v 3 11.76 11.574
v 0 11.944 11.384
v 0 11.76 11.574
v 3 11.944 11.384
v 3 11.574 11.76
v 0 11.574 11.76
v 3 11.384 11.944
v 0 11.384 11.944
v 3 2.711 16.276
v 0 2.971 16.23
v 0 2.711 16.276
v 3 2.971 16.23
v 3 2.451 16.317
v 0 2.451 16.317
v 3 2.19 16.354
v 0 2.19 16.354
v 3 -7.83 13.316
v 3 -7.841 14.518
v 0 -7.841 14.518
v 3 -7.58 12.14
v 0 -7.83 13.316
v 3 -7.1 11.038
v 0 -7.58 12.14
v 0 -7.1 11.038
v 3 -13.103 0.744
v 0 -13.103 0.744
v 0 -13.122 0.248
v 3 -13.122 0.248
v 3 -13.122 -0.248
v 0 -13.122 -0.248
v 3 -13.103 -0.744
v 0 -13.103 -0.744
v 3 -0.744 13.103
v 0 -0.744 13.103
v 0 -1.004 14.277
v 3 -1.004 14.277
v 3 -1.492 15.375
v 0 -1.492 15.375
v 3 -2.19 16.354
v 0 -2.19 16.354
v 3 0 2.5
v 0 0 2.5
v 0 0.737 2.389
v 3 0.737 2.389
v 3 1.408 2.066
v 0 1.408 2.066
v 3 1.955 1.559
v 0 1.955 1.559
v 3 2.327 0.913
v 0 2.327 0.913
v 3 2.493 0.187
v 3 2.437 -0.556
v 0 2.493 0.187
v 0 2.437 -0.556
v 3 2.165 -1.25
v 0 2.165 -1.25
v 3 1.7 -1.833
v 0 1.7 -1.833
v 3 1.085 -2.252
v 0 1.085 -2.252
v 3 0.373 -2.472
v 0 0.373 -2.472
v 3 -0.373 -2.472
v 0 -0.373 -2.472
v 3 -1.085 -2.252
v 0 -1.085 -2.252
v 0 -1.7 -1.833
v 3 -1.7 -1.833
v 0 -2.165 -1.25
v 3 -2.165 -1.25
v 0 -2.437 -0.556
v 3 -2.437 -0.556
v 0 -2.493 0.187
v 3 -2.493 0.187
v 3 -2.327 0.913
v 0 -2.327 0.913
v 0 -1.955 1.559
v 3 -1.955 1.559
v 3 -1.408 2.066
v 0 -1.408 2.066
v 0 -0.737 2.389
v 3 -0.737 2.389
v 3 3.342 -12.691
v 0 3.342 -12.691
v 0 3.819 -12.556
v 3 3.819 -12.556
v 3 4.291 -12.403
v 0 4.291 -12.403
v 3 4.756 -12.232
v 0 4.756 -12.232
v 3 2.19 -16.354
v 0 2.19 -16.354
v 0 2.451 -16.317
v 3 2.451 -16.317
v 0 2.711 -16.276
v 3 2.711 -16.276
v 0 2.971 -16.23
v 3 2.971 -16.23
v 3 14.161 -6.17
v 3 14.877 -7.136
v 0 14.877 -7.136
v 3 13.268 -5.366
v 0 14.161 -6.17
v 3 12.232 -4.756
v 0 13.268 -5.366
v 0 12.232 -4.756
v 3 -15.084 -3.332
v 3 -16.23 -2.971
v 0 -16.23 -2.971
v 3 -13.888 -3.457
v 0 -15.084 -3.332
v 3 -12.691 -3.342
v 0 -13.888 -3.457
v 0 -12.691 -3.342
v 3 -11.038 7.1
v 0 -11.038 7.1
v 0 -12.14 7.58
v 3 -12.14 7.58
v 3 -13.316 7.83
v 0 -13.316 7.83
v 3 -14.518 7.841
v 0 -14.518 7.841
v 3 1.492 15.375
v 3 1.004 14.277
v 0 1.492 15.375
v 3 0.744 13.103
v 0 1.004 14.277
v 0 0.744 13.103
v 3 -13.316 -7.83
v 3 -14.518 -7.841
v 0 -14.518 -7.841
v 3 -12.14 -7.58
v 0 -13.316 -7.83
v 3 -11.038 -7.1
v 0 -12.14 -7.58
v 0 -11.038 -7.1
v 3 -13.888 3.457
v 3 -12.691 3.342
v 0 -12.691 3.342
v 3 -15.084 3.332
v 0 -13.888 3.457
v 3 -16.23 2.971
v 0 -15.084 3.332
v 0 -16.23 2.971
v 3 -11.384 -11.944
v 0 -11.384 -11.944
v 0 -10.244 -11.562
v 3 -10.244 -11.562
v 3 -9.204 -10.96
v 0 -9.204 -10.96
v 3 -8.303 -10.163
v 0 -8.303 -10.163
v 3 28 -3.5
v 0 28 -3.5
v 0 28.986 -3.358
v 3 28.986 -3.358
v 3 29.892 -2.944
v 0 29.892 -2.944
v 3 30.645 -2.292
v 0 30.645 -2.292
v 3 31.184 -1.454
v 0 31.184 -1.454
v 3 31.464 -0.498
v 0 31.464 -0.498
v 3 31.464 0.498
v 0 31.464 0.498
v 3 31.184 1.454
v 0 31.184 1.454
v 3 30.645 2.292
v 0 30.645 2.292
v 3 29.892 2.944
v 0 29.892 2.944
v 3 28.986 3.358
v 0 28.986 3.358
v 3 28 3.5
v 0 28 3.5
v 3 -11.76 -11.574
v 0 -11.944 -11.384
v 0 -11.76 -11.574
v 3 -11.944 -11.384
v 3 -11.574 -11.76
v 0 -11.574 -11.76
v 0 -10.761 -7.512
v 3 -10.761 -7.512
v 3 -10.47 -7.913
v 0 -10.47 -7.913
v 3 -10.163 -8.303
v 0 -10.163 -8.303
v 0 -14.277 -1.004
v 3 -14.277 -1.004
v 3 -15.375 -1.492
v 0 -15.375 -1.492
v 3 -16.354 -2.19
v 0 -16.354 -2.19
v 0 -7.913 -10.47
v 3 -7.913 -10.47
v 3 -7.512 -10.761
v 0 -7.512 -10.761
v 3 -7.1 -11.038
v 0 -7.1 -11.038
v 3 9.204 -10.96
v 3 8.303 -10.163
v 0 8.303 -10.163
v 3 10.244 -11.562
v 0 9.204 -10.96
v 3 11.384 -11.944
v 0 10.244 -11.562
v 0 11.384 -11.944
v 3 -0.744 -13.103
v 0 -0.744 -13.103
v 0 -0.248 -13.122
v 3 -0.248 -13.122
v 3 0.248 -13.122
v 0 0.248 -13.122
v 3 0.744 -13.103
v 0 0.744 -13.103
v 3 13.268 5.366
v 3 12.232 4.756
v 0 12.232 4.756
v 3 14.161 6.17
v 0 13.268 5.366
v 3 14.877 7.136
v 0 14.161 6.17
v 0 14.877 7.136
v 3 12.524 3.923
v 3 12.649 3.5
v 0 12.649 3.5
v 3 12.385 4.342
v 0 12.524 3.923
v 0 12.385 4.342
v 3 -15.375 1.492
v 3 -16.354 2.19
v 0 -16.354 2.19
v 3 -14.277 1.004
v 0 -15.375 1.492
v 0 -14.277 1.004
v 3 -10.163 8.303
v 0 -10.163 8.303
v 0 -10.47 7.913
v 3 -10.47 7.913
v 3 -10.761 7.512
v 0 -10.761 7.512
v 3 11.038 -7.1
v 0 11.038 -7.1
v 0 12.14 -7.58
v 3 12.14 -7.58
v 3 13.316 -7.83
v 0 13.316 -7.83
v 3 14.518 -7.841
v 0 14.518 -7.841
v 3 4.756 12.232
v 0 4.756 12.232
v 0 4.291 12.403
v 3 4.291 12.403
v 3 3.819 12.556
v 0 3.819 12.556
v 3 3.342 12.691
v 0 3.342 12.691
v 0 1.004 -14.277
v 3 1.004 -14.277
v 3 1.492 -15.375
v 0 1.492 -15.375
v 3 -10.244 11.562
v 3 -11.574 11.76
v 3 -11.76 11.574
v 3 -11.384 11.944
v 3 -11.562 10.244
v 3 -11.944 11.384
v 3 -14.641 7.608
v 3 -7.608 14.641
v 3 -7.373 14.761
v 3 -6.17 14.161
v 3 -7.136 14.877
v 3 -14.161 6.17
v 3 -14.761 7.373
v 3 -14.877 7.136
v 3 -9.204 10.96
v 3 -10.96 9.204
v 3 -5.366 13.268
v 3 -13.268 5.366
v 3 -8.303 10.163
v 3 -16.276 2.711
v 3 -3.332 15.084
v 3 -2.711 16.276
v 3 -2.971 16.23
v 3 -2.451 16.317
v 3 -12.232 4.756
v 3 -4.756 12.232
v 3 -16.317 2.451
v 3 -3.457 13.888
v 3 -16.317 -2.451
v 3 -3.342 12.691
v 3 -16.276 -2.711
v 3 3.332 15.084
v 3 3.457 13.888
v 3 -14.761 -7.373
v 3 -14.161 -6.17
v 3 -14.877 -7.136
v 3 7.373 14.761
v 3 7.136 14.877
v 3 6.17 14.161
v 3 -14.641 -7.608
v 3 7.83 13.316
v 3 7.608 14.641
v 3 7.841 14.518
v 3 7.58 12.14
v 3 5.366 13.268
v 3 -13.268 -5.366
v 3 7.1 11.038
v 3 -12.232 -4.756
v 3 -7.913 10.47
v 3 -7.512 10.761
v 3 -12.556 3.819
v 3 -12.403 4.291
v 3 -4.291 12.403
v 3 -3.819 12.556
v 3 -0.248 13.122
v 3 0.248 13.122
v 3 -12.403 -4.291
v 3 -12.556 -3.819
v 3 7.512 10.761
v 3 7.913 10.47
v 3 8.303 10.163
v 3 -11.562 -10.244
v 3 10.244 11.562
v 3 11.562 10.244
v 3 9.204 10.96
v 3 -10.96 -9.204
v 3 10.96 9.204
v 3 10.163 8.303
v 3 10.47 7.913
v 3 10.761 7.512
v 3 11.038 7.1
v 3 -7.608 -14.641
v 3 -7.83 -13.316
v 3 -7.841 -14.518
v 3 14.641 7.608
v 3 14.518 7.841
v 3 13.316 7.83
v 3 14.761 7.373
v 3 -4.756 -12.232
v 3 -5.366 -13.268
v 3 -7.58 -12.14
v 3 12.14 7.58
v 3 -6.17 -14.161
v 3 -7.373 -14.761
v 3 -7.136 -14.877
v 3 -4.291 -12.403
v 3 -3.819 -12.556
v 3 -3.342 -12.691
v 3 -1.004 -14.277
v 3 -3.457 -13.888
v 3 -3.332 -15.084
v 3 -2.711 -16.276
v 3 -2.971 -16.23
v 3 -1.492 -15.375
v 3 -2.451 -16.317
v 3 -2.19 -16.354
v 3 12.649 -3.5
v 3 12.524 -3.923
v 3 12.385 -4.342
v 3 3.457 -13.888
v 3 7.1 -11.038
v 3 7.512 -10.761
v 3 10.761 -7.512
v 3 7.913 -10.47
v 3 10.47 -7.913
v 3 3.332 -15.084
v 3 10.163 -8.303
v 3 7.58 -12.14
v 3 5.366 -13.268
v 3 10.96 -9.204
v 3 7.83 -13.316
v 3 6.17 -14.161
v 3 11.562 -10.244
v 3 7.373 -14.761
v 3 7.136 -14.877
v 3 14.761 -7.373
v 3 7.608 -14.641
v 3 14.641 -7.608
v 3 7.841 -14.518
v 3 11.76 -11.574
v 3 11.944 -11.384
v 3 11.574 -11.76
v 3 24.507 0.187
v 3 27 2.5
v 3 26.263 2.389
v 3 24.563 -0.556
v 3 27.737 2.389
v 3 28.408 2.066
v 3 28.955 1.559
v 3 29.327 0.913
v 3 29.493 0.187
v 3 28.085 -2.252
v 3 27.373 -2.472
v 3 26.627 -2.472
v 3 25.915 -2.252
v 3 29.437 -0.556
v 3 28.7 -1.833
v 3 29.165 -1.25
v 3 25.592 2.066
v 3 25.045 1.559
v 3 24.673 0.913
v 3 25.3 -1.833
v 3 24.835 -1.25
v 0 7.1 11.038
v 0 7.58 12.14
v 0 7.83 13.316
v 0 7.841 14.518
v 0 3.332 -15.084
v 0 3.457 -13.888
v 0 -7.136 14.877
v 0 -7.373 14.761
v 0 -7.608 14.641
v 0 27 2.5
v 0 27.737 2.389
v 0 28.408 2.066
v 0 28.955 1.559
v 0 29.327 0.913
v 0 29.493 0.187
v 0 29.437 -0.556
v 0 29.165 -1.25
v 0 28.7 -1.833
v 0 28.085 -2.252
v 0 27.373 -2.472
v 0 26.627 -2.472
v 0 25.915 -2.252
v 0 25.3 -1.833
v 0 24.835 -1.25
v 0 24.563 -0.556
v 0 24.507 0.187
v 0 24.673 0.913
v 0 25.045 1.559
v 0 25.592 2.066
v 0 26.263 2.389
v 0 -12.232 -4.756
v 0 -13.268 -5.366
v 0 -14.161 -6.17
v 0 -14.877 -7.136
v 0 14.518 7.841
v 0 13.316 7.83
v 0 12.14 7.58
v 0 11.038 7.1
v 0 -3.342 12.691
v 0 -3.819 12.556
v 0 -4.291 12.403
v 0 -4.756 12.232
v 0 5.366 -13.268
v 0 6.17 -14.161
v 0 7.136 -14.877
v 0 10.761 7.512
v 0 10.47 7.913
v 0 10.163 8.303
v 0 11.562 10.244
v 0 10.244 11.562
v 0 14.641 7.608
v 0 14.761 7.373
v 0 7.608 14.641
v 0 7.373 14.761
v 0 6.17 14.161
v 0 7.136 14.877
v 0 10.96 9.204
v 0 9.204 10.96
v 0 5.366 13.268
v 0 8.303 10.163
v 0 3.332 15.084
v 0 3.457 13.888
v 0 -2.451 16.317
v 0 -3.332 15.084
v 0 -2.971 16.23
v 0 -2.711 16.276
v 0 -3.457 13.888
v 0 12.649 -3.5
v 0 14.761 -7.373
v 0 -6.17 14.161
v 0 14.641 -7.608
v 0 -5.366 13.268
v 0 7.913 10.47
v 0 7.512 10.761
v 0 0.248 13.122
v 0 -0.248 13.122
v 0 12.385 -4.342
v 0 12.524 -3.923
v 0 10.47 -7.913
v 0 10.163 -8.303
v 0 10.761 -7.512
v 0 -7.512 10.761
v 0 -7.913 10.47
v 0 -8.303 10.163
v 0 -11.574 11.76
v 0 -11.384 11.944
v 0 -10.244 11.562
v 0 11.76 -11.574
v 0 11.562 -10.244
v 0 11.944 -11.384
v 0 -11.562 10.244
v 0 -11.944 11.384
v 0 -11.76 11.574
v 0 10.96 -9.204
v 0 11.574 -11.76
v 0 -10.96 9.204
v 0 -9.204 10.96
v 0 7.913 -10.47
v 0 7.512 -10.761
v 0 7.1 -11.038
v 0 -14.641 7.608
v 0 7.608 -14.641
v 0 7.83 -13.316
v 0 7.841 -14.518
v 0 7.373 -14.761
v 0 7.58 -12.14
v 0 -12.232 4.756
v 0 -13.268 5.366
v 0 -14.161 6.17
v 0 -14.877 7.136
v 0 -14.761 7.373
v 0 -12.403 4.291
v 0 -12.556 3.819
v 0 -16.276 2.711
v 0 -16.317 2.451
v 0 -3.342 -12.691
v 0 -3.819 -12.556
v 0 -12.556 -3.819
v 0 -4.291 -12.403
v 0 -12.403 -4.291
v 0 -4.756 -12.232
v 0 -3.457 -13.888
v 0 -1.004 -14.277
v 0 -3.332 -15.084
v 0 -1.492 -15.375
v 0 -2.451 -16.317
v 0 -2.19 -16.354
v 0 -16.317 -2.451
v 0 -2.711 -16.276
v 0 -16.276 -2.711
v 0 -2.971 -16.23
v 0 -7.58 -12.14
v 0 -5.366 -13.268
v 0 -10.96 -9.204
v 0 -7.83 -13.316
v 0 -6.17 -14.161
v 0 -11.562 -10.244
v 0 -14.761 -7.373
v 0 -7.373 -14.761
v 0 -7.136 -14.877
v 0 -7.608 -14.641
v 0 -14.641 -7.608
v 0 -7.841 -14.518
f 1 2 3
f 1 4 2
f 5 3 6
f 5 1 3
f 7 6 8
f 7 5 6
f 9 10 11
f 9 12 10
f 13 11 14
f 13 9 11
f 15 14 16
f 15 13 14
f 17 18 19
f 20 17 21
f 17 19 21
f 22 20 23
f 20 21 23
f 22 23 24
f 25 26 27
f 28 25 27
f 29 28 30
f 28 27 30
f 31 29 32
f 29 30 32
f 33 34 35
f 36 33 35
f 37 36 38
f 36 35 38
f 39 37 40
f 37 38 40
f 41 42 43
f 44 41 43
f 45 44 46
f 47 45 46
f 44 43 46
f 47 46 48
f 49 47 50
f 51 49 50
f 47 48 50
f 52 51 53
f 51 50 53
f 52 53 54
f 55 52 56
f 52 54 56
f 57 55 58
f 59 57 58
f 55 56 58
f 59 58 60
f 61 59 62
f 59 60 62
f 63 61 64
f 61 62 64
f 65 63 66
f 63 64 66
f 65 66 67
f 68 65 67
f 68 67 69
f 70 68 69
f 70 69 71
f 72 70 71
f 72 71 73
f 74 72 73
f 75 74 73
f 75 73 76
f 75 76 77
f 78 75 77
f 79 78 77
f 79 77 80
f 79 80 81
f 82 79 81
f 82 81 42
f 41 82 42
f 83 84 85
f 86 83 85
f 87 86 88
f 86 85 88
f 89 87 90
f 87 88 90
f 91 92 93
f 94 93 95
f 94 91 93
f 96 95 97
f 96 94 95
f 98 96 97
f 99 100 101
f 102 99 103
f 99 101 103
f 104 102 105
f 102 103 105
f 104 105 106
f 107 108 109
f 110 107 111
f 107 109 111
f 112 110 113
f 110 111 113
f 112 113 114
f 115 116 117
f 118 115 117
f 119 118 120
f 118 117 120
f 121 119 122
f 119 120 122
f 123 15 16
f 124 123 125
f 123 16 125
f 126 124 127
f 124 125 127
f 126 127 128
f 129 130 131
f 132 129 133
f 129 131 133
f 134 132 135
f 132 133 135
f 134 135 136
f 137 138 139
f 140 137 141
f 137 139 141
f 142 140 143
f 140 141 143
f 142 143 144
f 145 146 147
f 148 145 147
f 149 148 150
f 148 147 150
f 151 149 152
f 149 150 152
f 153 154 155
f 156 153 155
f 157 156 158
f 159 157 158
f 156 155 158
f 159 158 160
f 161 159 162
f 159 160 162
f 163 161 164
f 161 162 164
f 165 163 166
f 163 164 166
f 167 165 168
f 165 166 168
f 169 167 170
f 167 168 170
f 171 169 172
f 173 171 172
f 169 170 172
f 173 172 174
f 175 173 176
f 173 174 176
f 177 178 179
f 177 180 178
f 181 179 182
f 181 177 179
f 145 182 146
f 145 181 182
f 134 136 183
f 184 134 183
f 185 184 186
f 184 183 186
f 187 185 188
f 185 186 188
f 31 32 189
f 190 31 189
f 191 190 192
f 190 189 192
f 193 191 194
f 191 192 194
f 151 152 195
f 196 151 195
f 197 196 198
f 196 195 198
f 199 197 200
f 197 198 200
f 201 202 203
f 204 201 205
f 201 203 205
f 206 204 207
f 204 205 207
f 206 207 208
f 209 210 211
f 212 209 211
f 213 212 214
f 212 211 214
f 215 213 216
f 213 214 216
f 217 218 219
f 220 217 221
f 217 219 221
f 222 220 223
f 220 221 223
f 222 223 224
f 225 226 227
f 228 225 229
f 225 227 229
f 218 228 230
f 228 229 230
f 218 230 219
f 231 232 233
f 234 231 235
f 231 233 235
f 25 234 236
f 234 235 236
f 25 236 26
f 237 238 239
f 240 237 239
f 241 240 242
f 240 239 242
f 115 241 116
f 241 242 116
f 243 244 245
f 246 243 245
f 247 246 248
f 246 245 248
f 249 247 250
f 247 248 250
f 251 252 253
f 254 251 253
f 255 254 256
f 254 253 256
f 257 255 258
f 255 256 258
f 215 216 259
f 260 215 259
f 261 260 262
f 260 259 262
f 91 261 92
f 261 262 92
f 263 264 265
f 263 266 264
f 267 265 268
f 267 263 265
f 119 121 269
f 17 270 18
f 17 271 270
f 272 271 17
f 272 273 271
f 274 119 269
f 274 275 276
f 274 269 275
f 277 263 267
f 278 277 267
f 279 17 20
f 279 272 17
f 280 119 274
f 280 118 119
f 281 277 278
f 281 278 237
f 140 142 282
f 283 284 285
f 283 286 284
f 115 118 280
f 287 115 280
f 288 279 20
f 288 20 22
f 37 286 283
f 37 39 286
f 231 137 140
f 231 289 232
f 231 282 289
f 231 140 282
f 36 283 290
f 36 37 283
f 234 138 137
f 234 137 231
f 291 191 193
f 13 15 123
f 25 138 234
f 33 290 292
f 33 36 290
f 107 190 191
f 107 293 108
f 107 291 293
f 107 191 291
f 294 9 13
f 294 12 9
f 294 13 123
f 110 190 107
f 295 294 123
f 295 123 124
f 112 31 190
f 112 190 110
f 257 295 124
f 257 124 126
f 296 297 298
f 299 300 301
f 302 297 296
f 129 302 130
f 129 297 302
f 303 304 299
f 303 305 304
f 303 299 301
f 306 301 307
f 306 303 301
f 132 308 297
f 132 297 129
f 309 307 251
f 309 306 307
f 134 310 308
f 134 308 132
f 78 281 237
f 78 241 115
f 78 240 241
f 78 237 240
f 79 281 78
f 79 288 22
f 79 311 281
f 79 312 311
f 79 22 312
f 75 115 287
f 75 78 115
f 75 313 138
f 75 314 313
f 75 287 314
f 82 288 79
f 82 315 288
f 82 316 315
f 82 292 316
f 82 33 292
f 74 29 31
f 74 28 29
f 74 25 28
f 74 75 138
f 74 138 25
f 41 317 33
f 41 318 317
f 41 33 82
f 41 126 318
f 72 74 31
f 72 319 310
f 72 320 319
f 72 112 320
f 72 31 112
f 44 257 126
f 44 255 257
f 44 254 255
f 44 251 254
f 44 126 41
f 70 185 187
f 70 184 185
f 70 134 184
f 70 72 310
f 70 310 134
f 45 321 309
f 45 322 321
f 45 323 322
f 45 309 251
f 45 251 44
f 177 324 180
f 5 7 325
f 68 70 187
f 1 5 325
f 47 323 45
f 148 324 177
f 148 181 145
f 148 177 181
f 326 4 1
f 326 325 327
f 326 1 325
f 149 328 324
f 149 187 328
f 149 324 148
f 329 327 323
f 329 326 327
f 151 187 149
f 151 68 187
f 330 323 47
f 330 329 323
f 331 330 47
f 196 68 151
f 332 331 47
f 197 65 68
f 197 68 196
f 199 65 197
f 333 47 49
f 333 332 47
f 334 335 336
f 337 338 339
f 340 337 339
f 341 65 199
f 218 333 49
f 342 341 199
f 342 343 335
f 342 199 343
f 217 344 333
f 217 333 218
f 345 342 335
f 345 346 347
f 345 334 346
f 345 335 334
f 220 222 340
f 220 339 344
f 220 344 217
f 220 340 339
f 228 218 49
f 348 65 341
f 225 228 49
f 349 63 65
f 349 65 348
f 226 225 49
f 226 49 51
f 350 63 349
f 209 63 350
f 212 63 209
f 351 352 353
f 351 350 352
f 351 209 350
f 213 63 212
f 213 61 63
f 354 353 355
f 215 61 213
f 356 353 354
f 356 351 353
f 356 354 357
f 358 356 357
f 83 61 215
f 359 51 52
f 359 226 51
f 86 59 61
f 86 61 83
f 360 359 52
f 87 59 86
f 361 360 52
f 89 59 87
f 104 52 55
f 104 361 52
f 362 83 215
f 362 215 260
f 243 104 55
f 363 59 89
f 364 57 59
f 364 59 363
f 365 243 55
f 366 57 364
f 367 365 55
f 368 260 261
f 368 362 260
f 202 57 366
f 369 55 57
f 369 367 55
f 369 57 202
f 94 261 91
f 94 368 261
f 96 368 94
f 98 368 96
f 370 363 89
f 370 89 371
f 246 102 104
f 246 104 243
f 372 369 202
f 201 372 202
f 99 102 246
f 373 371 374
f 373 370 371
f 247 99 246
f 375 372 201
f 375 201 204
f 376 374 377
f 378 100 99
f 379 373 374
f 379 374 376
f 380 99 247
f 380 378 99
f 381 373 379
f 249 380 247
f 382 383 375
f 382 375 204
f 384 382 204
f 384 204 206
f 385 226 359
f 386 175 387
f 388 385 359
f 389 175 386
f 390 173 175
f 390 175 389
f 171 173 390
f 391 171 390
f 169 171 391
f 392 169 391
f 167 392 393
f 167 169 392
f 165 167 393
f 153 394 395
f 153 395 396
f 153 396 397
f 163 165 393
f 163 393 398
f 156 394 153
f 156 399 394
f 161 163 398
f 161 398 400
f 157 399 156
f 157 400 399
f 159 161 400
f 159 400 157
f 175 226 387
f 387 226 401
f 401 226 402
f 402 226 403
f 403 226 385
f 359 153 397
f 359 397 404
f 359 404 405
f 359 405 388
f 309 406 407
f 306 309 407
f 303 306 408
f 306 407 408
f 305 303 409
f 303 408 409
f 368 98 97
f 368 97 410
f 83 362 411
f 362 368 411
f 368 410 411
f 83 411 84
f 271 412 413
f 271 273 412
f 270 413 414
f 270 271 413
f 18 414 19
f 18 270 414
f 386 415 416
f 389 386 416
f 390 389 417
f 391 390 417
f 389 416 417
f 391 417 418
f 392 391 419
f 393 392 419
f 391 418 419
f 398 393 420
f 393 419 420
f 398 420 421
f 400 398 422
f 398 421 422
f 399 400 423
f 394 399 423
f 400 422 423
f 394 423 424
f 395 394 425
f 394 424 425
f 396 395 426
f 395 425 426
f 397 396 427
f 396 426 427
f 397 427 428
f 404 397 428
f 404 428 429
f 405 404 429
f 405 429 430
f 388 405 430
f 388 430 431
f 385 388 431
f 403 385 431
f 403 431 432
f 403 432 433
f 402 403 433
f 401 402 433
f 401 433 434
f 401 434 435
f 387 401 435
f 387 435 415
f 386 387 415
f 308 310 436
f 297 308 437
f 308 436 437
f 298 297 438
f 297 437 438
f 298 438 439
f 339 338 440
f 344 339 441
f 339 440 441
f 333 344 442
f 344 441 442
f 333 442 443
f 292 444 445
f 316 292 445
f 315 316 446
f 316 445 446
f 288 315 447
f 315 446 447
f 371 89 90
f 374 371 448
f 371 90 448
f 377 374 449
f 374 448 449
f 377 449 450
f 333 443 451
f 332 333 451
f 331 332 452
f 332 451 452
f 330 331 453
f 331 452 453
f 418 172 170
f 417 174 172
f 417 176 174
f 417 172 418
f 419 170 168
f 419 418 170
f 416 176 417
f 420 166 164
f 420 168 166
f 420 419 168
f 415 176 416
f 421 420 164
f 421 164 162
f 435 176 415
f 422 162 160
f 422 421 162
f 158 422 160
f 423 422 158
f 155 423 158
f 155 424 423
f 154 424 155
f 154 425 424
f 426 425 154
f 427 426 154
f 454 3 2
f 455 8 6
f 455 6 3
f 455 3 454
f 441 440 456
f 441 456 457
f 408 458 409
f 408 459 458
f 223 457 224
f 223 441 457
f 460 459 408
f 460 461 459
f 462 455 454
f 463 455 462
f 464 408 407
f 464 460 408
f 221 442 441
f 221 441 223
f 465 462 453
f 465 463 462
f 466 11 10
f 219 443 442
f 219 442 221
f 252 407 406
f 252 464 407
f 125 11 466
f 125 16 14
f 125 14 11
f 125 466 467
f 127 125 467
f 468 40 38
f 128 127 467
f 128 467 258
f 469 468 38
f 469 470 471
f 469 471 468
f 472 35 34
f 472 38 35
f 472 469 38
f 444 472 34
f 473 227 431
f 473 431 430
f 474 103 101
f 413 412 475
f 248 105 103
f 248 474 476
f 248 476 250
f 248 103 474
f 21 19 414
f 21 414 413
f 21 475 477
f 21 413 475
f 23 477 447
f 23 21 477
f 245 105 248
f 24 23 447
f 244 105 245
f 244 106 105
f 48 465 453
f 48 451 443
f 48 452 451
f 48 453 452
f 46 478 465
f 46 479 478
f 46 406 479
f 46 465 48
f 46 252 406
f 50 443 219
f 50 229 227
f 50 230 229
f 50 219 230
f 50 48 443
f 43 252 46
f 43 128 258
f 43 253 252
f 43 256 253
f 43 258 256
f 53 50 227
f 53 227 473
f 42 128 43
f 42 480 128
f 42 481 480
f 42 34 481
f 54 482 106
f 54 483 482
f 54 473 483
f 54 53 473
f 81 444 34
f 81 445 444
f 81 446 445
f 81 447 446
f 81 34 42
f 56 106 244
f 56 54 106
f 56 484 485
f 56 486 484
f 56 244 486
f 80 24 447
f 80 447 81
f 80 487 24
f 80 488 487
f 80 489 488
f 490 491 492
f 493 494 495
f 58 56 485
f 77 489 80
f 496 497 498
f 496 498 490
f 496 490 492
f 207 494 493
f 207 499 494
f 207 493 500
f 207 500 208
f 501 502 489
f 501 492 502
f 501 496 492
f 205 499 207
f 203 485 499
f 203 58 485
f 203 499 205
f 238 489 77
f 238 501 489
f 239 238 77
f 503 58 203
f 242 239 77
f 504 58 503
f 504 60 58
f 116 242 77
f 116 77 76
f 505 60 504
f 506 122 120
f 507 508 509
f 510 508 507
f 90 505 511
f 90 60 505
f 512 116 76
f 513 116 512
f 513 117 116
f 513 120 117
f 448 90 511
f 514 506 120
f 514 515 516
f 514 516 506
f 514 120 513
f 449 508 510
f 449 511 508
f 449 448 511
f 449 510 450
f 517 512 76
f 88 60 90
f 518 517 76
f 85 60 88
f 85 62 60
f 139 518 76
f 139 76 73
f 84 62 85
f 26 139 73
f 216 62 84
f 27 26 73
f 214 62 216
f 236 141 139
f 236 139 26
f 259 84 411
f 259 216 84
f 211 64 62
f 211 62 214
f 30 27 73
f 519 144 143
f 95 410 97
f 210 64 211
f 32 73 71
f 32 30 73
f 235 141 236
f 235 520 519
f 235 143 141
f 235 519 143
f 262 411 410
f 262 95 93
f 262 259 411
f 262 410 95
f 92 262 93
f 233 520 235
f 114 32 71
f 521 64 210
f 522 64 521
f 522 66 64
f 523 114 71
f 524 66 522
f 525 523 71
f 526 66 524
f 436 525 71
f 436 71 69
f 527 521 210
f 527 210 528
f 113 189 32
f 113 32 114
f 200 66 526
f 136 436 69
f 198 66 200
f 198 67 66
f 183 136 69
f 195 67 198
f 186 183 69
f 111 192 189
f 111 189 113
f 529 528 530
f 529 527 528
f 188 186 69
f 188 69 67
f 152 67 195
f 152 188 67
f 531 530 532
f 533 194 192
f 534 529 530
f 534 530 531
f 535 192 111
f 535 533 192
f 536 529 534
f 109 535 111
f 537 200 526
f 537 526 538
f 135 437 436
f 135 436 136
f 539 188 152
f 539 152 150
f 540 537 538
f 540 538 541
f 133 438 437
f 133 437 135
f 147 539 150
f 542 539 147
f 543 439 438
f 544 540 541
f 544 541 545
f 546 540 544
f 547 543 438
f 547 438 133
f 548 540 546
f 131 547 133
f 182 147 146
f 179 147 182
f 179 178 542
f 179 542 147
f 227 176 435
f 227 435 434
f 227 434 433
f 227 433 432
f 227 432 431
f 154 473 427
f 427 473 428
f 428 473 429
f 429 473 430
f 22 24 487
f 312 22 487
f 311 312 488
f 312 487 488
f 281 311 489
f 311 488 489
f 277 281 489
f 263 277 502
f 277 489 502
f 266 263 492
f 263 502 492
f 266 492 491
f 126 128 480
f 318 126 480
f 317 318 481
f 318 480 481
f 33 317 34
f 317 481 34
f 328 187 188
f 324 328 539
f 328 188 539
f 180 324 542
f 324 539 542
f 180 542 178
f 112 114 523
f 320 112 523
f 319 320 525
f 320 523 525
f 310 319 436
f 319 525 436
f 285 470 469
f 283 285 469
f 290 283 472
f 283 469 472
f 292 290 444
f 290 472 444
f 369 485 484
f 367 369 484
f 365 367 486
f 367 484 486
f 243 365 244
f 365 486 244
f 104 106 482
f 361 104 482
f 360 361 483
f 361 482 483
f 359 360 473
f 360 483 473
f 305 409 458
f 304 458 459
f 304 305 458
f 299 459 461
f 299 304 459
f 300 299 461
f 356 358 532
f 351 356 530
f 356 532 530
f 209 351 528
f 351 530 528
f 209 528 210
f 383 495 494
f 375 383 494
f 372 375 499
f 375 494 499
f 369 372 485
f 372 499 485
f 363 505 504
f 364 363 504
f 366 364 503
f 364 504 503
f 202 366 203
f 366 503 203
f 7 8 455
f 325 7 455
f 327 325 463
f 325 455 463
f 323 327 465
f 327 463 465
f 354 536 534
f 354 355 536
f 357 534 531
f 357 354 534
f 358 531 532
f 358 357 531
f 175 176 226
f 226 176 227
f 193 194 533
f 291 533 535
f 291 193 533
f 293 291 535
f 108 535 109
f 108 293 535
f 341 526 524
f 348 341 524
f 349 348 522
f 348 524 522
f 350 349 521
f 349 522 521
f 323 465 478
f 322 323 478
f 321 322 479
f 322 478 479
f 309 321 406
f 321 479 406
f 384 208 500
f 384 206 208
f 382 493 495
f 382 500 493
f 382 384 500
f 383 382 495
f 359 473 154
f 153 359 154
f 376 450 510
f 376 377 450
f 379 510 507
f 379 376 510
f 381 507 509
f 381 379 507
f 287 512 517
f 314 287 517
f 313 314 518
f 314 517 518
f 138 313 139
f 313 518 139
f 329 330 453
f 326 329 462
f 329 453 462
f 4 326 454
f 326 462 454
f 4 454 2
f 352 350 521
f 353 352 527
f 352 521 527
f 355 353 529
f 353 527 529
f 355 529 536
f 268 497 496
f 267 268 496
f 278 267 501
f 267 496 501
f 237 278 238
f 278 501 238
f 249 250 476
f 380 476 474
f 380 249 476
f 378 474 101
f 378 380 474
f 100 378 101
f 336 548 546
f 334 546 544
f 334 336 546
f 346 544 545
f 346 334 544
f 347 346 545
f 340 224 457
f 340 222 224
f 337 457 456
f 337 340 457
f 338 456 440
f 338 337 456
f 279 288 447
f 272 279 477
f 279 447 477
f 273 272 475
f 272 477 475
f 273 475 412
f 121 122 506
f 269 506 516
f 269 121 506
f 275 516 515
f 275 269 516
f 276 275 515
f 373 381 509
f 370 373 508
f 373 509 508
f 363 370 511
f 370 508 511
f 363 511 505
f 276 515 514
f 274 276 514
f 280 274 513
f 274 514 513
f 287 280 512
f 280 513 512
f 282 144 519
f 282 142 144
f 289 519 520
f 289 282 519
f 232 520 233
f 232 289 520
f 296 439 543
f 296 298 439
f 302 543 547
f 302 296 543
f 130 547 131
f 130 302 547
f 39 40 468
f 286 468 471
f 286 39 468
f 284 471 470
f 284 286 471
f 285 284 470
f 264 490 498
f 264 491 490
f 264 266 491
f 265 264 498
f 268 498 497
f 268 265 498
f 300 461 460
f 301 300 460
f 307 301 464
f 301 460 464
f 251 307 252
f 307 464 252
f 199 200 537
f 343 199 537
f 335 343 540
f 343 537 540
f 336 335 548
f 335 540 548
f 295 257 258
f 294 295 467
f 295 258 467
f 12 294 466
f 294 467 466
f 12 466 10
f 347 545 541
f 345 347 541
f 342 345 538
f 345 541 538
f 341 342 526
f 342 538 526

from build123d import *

# Parameters (mm, degrees)
BASPROSKE_W         = 3
BASPROSKE_H         = 16.5
TOOTHCUT_DEPTH      = 24.526580712
TEETHCUTS_COUNT     = 20
TEETHCUTS_ANGLE     = 342
EXTRUDE_3_DEPTH     = 3
SKETCH_3_R          = 2.5
CUT_EXTRUDE_2_DEPTH = 36.618883333


with BuildPart() as part:
    # BasProSke → Base-Revolve (revolve)
    with BuildSketch(Plane(origin=(0, 0, 0), x_dir=(1, 0, 0), z_dir=(0, 1, 0)), mode=Mode.PRIVATE) as base_revolve_sk:
        with Locations((1.5, 8.25)):
            Rectangle(BASPROSKE_W, BASPROSKE_H)
    revolve(base_revolve_sk.sketch.rotate(Axis((-10, 0, 0), (1, 0, 0)), 180), axis=Axis((-10, 0, 0), (1, 0, 0)))

    # TooCutSke → ToothCut (cut, through all)
    with BuildSketch(Plane(origin=(0, 0, 0), x_dir=(0, 0, -1), z_dir=(1, 0, 0))):
        with BuildLine():
            ThreePointArc((0.74381438, 13.102904875), (0, 13.124), (-0.74381438, 13.102904875))
            ThreePointArc((-0.74381438, 13.102904875), (-1.226473103, 14.852072512), (-2.209965745, 16.376962373))
            ThreePointArc((-2.209965745, 16.376962373), (0, 16.5254), (2.209965745, 16.376962373))
            ThreePointArc((2.209965745, 16.376962373), (1.226473103, 14.852072512), (0.74381438, 13.102904875))
        make_face()
    toothcut = extrude(amount=TOOTHCUT_DEPTH, mode=Mode.SUBTRACT)

    # TeethCuts: ToothCut ×20 about axis
    teethcuts_axis = Axis((-10, 0, 0), (1, 0, 0))
    for i in range(1, TEETHCUTS_COUNT):
        add(toothcut.rotate(teethcuts_axis, i * TEETHCUTS_ANGLE / (TEETHCUTS_COUNT - 1)), mode=Mode.SUBTRACT)

    # 草图2 → 凸台-拉伸3 (add)
    with BuildSketch(Plane.ZY):
        with BuildLine():
            Line((-3.5, 0), (-3.5, 28))
            ThreePointArc((-3.5, 28), (0, 31.5), (3.5, 28))
            Line((3.5, 28), (3.5, 0))
            ThreePointArc((3.5, 0), (0, -3.5), (-3.5, 0))
        make_face()
    extrude(amount=-EXTRUDE_3_DEPTH)

    # 草图3 → 切除-拉伸2 (cut, through all)
    with BuildSketch(Plane.ZY):
        Circle(SKETCH_3_R)
        with Locations((0, 27)):
            Circle(SKETCH_3_R)
    extrude(amount=-CUT_EXTRUDE_2_DEPTH, mode=Mode.SUBTRACT)


solid = part.part
